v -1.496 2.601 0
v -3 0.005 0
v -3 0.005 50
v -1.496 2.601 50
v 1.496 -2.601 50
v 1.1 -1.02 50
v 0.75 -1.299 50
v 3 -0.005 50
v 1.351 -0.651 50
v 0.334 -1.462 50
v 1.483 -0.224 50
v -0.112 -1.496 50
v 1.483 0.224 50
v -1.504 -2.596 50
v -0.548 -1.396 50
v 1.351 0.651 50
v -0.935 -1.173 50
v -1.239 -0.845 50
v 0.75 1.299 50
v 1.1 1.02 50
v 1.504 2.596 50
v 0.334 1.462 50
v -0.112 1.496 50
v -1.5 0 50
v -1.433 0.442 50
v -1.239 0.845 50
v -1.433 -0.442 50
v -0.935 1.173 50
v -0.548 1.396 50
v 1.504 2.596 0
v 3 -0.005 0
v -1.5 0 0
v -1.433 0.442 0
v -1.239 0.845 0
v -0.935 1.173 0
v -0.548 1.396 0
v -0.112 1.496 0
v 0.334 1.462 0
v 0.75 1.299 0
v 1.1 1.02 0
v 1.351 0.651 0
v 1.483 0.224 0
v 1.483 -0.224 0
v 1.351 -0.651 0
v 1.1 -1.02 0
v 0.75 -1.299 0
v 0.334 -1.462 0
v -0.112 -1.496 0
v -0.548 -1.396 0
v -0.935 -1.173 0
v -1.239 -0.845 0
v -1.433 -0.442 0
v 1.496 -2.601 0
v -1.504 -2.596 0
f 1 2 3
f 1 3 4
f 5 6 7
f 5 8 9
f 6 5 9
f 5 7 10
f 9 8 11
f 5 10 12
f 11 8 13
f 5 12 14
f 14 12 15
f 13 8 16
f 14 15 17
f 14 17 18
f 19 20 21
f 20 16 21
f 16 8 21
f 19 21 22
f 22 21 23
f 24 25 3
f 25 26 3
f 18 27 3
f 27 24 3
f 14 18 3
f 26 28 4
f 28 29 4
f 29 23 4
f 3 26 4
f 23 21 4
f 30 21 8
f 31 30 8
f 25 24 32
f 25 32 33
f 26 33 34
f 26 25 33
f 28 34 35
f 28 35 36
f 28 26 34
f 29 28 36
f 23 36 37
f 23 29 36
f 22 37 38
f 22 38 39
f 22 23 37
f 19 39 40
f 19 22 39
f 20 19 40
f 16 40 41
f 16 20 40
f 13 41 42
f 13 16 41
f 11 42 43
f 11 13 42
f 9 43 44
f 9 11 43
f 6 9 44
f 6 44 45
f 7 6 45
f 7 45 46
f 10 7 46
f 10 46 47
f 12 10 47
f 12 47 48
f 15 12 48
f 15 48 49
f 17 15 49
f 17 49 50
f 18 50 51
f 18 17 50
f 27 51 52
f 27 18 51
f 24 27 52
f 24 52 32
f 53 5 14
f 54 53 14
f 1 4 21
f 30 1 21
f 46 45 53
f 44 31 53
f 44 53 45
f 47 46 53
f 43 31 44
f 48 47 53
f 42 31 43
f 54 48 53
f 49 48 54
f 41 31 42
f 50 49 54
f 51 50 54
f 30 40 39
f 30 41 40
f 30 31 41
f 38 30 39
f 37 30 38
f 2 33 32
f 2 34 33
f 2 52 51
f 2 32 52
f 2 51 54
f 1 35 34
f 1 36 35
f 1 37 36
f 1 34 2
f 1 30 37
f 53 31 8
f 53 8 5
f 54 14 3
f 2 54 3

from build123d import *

# Parameters (mm, degrees)
SKETCH_1_W      = 1
SKETCH_1_H      = 50
SKETCH_5_R      = 1.5
EXTRUDE_4_DEPTH = 50


with BuildPart() as part:
    # 草图1 → 旋转1 (revolve)
    with BuildSketch(Plane.XZ, mode=Mode.PRIVATE) as revolve_1_sk:
        with Locations((2, 25)):
            Rectangle(SKETCH_1_W, SKETCH_1_H)
    revolve(revolve_1_sk.sketch.rotate(Axis((0, 0, 50), (0, 0, -1)), 180), axis=Axis((0, 0, 50), (0, 0, -1)))

    # 草图5 → 凸台-拉伸4 (add)
    with BuildSketch(Plane(origin=(0, 0, 0), x_dir=(-1, 0, 0), z_dir=(0, 0, -1))):
        Polygon((-1.504244122, 2.59562124), (-2.999995993, -0.004903003), (-1.495751872, -2.600524243), (1.504244122, -2.59562124), (2.999995993, 0.004903003), (1.495751872, 2.600524243), align=None)
        Circle(SKETCH_5_R, mode=Mode.SUBTRACT)
    extrude(amount=-EXTRUDE_4_DEPTH)


solid = part.part
